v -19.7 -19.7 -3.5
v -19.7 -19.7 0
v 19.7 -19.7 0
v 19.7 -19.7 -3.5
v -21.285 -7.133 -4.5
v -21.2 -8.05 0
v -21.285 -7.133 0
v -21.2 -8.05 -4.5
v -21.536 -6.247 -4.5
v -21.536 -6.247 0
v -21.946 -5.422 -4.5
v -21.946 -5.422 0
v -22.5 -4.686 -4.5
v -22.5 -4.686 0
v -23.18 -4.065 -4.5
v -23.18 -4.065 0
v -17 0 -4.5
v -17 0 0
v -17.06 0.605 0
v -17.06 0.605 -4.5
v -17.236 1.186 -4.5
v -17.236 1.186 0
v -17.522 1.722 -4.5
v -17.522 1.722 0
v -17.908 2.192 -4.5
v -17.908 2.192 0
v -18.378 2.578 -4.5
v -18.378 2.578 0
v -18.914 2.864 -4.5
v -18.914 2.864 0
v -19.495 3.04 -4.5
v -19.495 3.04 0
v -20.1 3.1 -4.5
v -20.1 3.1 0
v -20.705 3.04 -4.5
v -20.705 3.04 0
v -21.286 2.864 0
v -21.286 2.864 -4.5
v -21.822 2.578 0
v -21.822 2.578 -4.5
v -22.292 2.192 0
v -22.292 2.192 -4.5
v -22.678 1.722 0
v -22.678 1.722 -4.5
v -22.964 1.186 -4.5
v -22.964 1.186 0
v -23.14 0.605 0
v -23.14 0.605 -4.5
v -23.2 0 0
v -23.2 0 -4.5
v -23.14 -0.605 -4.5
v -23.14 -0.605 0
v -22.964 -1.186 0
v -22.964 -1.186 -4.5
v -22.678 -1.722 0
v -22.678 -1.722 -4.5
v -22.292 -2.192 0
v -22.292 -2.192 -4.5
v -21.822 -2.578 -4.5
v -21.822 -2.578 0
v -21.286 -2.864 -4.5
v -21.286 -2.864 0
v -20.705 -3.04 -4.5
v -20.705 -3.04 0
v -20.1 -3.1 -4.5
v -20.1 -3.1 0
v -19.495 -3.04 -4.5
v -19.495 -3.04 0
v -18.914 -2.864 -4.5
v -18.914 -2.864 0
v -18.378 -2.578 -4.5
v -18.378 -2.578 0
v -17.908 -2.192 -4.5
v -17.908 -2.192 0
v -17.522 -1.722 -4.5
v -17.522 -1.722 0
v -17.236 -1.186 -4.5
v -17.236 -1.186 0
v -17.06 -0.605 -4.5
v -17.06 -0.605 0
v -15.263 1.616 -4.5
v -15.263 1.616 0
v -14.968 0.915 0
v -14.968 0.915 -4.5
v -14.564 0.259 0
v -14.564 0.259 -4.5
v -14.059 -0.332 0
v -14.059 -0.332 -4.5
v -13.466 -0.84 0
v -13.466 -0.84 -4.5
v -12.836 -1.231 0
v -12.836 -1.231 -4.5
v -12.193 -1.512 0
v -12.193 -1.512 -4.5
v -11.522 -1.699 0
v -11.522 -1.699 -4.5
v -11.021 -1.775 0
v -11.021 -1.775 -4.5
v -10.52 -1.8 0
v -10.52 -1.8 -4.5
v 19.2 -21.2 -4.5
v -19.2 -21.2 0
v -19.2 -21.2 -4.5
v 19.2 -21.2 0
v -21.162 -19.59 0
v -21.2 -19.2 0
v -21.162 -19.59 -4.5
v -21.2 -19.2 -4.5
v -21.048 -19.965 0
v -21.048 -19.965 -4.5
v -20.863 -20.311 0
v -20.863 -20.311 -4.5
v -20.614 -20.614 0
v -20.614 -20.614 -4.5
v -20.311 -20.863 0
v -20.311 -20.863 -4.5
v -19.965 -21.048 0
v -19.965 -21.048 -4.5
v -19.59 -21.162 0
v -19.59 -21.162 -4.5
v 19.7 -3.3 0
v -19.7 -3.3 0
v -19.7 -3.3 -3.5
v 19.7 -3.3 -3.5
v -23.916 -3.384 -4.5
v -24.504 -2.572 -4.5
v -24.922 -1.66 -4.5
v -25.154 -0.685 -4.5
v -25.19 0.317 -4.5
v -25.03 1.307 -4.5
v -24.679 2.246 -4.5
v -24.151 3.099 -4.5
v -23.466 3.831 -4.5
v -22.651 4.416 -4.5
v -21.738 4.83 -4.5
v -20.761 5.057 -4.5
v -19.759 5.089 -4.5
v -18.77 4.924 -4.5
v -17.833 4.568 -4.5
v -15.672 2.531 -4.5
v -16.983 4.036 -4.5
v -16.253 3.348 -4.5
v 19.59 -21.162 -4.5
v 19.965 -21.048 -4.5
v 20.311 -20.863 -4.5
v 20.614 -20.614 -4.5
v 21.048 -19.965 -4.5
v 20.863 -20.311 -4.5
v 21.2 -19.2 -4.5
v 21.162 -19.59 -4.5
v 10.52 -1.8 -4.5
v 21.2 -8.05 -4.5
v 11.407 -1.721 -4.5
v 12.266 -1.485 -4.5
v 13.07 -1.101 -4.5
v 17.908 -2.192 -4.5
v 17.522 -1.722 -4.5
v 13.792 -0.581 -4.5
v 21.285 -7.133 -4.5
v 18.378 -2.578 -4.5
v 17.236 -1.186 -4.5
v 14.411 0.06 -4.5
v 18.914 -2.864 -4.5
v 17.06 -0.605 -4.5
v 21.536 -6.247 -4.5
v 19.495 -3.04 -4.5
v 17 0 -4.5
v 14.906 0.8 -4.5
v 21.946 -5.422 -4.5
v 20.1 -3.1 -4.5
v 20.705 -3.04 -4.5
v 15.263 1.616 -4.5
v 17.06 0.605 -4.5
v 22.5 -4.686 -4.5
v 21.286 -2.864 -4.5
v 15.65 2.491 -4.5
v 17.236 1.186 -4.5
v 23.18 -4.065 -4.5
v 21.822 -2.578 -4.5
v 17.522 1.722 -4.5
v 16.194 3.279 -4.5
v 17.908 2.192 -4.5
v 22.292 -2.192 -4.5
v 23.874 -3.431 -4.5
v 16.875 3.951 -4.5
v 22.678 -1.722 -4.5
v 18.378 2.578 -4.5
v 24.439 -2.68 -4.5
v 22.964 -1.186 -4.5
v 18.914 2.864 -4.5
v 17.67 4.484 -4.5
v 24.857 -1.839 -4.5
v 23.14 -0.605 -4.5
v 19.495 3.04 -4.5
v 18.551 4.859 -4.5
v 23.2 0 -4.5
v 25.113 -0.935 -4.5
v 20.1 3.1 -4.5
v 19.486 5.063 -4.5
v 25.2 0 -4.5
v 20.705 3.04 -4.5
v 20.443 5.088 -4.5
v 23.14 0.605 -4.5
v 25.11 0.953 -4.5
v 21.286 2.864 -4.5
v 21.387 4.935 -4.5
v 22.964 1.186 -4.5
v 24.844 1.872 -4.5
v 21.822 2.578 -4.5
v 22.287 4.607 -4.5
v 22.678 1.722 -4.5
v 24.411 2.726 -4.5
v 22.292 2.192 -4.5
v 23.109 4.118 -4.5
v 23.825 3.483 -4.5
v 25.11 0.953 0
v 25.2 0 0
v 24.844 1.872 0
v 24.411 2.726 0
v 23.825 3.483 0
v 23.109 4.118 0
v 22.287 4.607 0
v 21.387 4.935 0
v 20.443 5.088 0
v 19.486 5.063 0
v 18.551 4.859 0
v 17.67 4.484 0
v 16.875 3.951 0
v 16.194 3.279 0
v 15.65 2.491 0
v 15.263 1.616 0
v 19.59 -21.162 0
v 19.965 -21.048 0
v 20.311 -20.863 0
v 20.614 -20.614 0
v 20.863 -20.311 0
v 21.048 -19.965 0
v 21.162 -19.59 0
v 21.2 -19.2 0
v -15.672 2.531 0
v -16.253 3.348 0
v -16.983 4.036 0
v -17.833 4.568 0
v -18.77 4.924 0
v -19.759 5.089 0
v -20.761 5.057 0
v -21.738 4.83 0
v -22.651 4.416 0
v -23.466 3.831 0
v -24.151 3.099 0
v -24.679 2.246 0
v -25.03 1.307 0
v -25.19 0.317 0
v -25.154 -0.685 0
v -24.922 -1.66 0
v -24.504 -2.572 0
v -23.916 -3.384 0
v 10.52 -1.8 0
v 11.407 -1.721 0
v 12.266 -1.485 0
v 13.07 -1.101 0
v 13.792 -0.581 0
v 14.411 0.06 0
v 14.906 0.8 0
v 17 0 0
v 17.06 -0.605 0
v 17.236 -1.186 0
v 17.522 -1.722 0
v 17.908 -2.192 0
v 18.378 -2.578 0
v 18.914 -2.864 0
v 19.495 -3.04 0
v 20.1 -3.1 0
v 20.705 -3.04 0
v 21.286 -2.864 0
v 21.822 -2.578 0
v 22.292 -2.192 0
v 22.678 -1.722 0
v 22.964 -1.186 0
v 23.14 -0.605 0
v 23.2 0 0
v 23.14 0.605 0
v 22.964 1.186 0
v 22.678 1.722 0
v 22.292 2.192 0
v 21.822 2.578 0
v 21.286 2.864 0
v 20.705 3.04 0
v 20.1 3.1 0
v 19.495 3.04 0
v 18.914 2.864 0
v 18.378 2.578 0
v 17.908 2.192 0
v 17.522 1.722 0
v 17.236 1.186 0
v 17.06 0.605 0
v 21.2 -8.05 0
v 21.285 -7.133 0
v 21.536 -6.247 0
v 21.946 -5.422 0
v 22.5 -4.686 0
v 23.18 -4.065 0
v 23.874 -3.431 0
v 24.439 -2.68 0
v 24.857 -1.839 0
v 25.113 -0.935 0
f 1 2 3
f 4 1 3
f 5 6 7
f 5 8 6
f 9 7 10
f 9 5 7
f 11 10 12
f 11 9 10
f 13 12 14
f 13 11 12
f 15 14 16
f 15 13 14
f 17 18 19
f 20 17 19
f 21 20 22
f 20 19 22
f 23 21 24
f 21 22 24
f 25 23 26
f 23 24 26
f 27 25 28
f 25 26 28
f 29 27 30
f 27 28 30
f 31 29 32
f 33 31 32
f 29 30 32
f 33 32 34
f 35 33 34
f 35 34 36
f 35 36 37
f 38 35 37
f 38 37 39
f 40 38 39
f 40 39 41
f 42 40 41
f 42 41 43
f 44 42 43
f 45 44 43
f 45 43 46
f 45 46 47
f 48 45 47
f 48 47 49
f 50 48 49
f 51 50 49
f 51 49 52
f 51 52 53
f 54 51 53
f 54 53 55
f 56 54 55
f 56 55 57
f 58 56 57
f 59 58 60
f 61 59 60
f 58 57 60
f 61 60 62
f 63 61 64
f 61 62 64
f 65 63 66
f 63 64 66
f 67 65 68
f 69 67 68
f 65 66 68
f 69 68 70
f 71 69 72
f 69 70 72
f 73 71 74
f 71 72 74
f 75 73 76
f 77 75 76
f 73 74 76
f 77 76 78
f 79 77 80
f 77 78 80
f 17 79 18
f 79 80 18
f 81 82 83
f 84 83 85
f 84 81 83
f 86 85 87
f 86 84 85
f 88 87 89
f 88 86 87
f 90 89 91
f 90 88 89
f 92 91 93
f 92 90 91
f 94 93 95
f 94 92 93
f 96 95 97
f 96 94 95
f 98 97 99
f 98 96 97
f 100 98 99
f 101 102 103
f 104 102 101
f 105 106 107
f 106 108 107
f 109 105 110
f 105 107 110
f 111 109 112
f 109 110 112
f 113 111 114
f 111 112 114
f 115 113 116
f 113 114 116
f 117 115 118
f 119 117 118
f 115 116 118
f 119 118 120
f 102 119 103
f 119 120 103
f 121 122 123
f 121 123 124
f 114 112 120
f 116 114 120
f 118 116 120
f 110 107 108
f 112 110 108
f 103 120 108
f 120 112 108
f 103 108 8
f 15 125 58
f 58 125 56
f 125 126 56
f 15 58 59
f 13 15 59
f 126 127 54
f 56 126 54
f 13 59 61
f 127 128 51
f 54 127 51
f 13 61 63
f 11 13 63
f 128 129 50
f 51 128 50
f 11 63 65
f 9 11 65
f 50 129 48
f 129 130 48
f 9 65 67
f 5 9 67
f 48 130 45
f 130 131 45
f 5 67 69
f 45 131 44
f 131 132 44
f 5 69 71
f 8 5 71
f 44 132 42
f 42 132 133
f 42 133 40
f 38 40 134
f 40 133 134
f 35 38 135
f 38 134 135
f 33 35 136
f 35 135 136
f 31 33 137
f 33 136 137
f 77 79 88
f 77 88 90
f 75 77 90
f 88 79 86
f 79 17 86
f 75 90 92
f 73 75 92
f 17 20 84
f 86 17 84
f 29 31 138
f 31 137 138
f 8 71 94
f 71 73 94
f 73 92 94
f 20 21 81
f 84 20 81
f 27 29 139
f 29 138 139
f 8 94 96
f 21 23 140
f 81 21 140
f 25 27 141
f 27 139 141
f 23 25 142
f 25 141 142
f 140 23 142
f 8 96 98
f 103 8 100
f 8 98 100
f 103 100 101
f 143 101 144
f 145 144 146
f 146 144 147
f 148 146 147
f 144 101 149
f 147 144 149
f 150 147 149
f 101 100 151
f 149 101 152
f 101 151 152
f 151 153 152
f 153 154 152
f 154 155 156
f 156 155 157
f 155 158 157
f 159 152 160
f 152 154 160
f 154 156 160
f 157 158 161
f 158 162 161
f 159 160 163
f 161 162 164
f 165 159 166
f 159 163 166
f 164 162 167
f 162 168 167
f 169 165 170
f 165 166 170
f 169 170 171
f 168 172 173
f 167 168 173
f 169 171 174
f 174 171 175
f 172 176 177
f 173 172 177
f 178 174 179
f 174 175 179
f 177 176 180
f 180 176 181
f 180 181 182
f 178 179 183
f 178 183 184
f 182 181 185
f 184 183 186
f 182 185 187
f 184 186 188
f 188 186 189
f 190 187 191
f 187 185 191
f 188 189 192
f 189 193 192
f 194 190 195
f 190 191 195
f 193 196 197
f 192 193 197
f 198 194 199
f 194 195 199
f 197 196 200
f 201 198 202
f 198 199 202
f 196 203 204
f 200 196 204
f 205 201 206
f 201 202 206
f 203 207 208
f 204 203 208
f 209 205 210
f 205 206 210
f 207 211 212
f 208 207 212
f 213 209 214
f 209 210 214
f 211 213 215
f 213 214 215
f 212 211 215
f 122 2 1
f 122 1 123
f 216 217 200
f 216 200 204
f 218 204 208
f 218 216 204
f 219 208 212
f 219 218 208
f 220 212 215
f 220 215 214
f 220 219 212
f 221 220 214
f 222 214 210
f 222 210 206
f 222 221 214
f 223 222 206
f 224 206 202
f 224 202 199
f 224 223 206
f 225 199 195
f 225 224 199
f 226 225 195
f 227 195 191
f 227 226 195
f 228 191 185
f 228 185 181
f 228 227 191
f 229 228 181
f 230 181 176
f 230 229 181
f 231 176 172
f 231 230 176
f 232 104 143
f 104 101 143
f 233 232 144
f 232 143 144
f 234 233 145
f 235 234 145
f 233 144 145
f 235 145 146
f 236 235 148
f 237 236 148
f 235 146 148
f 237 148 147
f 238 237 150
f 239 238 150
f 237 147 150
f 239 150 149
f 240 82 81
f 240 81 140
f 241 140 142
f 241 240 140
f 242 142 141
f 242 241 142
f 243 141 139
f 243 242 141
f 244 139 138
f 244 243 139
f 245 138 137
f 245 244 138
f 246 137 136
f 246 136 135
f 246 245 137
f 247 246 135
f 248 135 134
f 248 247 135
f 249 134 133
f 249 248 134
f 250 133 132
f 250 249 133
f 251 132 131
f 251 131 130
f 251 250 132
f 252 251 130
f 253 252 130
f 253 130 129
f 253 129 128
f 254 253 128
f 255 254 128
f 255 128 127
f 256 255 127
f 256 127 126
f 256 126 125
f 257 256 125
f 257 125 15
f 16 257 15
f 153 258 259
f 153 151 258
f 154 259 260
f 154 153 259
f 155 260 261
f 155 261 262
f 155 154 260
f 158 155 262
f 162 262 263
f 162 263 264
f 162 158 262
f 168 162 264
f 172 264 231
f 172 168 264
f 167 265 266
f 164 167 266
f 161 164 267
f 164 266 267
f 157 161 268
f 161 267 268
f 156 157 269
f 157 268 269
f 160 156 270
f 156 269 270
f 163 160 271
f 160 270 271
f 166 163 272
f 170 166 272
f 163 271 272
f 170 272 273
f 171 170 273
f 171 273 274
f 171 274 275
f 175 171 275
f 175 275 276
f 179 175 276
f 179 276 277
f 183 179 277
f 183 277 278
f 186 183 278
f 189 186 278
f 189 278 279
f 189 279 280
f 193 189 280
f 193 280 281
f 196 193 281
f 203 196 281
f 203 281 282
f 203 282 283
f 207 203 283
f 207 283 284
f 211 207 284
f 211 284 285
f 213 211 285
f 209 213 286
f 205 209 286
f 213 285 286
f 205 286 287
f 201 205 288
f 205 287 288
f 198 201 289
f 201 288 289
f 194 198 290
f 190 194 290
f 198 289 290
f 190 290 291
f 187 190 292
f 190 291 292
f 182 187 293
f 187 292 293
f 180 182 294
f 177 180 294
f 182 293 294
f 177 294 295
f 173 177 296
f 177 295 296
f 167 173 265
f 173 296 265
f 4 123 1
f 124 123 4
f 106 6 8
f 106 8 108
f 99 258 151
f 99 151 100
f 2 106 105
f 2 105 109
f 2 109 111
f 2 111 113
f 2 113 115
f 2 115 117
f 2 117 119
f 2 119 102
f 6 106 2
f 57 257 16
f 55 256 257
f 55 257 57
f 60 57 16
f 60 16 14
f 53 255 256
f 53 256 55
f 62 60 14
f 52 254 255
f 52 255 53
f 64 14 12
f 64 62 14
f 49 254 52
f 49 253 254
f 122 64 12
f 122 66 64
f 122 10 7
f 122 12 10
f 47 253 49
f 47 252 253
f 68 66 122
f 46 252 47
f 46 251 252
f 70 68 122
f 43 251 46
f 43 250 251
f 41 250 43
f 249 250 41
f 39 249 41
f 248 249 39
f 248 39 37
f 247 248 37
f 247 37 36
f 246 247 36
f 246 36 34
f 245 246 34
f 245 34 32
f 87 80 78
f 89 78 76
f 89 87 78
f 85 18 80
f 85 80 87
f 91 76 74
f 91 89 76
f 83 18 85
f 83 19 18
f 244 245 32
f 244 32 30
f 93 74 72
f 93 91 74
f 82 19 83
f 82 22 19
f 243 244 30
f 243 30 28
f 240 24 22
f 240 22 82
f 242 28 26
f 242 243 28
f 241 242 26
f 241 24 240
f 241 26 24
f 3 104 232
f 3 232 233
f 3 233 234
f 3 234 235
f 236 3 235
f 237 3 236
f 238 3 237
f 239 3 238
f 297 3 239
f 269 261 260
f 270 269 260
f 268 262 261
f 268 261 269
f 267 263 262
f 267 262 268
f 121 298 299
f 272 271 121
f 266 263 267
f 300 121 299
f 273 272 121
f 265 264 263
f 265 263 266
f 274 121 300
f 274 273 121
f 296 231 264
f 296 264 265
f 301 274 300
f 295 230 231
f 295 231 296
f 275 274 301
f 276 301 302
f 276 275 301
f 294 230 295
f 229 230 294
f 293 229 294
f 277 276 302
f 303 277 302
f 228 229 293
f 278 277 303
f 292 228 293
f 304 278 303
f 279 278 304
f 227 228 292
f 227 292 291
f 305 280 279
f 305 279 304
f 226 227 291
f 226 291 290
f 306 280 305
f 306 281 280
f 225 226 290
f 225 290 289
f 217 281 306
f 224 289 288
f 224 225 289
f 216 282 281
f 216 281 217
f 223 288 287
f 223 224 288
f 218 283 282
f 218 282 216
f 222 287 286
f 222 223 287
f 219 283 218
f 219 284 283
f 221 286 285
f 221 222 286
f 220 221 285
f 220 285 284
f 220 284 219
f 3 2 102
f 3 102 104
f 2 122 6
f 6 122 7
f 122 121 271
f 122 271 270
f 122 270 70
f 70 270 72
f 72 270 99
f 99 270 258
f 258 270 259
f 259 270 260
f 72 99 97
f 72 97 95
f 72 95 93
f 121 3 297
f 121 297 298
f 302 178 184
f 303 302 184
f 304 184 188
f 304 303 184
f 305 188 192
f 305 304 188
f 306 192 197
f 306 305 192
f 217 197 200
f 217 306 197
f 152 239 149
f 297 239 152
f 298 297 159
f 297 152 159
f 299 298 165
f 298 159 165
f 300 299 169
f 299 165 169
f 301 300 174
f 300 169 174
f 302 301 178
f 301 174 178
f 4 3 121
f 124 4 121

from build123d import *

# Parameters (mm, degrees)
F2_DEPTH = 4.5
F0_R     = 3.1
F3_DEPTH = 4.501
F0_W     = 39.4
F0_H     = 16.4
F4_DEPTH = 3.5
F5_R     = 2
F6_R     = 5


with BuildPart() as f2:
    # F1 (on Top) → F2 (new body)
    with BuildSketch(Plane.XY):
        with BuildLine():
            Line((-21.2, -1.8), (-15.328208, -1.8))
            ThreePointArc((-15.328208, -1.8), (-15.082723, -0.914839), (-15, 0))
            ThreePointArc((-15, 0), (-23.293744, 3.976179), (-21.2, -4.97996))
            Line((-21.2, -4.97996), (-21.2, -1.8))
        make_face()
        with BuildLine():
            ThreePointArc((21.2, -4.97996), (17.671307, -4.484579), (15.328208, -1.8))
            Line((15.328208, -1.8), (-15.328208, -1.8))
            ThreePointArc((-15.328208, -1.8), (-17.671307, -4.484579), (-21.2, -4.97996))
            Line((-21.2, -4.97996), (-21.2, -21.2))
            Line((-21.2, -21.2), (21.2, -21.2))
            Line((21.2, -21.2), (21.2, -4.97996))
        make_face()
        with BuildLine():
            Line((15.328208, -1.8), (21.2, -1.8))
            Line((21.2, -1.8), (21.2, -4.97996))
            ThreePointArc((21.2, -4.97996), (24.076179, -3.193744), (25.2, 0))
            ThreePointArc((25.2, 0), (19.185161, 5.017277), (15.328208, -1.8))
        make_face()
        with BuildLine():
            Line((21.2, -4.97996), (21.2, -1.8))
            Line((21.2, -1.8), (15.328208, -1.8))
            ThreePointArc((15.328208, -1.8), (17.671307, -4.484579), (21.2, -4.97996))
        make_face()
        with BuildLine():
            ThreePointArc((-21.2, -4.97996), (-17.671307, -4.484579), (-15.328208, -1.8))
            Line((-15.328208, -1.8), (-21.2, -1.8))
            Line((-21.2, -1.8), (-21.2, -4.97996))
        make_face()
    extrude(amount=-F2_DEPTH)

    # F0 (on Top) → F3 (cut, through all)
    with BuildSketch(Plane.XY):
        with Locations((-20.1, 0)):
            Circle(F0_R)
        with BuildLine():
            ThreePointArc((23.2, 0), (20.1, 3.1), (17, 0))
            ThreePointArc((17, 0), (20.1, -3.1), (23.2, 0))
        make_face()
    extrude(amount=-F3_DEPTH, mode=Mode.SUBTRACT)

    # F0 (on Top) → F4 (cut)
    with BuildSketch(Plane.XY):
        with Locations((0, -11.5)):
            Rectangle(F0_W, F0_H)
    extrude(amount=-F4_DEPTH, mode=Mode.SUBTRACT)

    # F5
    f5_edges = [f2.edges().sort_by_distance(p)[0] for p in [
        (-21.2, -21.2, -2.25),
        (21.2, -21.2, -2.25),
    ]]
    fillet(f5_edges, radius=F5_R)

    # F6
    f6_edges = [f2.edges().sort_by_distance(p)[0] for p in [
        (-21.2, -4.97996, -2.25),
        (-15.328208, -1.8, -2.25),
        (21.2, -4.97996, -2.25),
        (15.328208, -1.8, -2.25),
    ]]
    fillet(f6_edges, radius=F6_R)


solid = f2.part
